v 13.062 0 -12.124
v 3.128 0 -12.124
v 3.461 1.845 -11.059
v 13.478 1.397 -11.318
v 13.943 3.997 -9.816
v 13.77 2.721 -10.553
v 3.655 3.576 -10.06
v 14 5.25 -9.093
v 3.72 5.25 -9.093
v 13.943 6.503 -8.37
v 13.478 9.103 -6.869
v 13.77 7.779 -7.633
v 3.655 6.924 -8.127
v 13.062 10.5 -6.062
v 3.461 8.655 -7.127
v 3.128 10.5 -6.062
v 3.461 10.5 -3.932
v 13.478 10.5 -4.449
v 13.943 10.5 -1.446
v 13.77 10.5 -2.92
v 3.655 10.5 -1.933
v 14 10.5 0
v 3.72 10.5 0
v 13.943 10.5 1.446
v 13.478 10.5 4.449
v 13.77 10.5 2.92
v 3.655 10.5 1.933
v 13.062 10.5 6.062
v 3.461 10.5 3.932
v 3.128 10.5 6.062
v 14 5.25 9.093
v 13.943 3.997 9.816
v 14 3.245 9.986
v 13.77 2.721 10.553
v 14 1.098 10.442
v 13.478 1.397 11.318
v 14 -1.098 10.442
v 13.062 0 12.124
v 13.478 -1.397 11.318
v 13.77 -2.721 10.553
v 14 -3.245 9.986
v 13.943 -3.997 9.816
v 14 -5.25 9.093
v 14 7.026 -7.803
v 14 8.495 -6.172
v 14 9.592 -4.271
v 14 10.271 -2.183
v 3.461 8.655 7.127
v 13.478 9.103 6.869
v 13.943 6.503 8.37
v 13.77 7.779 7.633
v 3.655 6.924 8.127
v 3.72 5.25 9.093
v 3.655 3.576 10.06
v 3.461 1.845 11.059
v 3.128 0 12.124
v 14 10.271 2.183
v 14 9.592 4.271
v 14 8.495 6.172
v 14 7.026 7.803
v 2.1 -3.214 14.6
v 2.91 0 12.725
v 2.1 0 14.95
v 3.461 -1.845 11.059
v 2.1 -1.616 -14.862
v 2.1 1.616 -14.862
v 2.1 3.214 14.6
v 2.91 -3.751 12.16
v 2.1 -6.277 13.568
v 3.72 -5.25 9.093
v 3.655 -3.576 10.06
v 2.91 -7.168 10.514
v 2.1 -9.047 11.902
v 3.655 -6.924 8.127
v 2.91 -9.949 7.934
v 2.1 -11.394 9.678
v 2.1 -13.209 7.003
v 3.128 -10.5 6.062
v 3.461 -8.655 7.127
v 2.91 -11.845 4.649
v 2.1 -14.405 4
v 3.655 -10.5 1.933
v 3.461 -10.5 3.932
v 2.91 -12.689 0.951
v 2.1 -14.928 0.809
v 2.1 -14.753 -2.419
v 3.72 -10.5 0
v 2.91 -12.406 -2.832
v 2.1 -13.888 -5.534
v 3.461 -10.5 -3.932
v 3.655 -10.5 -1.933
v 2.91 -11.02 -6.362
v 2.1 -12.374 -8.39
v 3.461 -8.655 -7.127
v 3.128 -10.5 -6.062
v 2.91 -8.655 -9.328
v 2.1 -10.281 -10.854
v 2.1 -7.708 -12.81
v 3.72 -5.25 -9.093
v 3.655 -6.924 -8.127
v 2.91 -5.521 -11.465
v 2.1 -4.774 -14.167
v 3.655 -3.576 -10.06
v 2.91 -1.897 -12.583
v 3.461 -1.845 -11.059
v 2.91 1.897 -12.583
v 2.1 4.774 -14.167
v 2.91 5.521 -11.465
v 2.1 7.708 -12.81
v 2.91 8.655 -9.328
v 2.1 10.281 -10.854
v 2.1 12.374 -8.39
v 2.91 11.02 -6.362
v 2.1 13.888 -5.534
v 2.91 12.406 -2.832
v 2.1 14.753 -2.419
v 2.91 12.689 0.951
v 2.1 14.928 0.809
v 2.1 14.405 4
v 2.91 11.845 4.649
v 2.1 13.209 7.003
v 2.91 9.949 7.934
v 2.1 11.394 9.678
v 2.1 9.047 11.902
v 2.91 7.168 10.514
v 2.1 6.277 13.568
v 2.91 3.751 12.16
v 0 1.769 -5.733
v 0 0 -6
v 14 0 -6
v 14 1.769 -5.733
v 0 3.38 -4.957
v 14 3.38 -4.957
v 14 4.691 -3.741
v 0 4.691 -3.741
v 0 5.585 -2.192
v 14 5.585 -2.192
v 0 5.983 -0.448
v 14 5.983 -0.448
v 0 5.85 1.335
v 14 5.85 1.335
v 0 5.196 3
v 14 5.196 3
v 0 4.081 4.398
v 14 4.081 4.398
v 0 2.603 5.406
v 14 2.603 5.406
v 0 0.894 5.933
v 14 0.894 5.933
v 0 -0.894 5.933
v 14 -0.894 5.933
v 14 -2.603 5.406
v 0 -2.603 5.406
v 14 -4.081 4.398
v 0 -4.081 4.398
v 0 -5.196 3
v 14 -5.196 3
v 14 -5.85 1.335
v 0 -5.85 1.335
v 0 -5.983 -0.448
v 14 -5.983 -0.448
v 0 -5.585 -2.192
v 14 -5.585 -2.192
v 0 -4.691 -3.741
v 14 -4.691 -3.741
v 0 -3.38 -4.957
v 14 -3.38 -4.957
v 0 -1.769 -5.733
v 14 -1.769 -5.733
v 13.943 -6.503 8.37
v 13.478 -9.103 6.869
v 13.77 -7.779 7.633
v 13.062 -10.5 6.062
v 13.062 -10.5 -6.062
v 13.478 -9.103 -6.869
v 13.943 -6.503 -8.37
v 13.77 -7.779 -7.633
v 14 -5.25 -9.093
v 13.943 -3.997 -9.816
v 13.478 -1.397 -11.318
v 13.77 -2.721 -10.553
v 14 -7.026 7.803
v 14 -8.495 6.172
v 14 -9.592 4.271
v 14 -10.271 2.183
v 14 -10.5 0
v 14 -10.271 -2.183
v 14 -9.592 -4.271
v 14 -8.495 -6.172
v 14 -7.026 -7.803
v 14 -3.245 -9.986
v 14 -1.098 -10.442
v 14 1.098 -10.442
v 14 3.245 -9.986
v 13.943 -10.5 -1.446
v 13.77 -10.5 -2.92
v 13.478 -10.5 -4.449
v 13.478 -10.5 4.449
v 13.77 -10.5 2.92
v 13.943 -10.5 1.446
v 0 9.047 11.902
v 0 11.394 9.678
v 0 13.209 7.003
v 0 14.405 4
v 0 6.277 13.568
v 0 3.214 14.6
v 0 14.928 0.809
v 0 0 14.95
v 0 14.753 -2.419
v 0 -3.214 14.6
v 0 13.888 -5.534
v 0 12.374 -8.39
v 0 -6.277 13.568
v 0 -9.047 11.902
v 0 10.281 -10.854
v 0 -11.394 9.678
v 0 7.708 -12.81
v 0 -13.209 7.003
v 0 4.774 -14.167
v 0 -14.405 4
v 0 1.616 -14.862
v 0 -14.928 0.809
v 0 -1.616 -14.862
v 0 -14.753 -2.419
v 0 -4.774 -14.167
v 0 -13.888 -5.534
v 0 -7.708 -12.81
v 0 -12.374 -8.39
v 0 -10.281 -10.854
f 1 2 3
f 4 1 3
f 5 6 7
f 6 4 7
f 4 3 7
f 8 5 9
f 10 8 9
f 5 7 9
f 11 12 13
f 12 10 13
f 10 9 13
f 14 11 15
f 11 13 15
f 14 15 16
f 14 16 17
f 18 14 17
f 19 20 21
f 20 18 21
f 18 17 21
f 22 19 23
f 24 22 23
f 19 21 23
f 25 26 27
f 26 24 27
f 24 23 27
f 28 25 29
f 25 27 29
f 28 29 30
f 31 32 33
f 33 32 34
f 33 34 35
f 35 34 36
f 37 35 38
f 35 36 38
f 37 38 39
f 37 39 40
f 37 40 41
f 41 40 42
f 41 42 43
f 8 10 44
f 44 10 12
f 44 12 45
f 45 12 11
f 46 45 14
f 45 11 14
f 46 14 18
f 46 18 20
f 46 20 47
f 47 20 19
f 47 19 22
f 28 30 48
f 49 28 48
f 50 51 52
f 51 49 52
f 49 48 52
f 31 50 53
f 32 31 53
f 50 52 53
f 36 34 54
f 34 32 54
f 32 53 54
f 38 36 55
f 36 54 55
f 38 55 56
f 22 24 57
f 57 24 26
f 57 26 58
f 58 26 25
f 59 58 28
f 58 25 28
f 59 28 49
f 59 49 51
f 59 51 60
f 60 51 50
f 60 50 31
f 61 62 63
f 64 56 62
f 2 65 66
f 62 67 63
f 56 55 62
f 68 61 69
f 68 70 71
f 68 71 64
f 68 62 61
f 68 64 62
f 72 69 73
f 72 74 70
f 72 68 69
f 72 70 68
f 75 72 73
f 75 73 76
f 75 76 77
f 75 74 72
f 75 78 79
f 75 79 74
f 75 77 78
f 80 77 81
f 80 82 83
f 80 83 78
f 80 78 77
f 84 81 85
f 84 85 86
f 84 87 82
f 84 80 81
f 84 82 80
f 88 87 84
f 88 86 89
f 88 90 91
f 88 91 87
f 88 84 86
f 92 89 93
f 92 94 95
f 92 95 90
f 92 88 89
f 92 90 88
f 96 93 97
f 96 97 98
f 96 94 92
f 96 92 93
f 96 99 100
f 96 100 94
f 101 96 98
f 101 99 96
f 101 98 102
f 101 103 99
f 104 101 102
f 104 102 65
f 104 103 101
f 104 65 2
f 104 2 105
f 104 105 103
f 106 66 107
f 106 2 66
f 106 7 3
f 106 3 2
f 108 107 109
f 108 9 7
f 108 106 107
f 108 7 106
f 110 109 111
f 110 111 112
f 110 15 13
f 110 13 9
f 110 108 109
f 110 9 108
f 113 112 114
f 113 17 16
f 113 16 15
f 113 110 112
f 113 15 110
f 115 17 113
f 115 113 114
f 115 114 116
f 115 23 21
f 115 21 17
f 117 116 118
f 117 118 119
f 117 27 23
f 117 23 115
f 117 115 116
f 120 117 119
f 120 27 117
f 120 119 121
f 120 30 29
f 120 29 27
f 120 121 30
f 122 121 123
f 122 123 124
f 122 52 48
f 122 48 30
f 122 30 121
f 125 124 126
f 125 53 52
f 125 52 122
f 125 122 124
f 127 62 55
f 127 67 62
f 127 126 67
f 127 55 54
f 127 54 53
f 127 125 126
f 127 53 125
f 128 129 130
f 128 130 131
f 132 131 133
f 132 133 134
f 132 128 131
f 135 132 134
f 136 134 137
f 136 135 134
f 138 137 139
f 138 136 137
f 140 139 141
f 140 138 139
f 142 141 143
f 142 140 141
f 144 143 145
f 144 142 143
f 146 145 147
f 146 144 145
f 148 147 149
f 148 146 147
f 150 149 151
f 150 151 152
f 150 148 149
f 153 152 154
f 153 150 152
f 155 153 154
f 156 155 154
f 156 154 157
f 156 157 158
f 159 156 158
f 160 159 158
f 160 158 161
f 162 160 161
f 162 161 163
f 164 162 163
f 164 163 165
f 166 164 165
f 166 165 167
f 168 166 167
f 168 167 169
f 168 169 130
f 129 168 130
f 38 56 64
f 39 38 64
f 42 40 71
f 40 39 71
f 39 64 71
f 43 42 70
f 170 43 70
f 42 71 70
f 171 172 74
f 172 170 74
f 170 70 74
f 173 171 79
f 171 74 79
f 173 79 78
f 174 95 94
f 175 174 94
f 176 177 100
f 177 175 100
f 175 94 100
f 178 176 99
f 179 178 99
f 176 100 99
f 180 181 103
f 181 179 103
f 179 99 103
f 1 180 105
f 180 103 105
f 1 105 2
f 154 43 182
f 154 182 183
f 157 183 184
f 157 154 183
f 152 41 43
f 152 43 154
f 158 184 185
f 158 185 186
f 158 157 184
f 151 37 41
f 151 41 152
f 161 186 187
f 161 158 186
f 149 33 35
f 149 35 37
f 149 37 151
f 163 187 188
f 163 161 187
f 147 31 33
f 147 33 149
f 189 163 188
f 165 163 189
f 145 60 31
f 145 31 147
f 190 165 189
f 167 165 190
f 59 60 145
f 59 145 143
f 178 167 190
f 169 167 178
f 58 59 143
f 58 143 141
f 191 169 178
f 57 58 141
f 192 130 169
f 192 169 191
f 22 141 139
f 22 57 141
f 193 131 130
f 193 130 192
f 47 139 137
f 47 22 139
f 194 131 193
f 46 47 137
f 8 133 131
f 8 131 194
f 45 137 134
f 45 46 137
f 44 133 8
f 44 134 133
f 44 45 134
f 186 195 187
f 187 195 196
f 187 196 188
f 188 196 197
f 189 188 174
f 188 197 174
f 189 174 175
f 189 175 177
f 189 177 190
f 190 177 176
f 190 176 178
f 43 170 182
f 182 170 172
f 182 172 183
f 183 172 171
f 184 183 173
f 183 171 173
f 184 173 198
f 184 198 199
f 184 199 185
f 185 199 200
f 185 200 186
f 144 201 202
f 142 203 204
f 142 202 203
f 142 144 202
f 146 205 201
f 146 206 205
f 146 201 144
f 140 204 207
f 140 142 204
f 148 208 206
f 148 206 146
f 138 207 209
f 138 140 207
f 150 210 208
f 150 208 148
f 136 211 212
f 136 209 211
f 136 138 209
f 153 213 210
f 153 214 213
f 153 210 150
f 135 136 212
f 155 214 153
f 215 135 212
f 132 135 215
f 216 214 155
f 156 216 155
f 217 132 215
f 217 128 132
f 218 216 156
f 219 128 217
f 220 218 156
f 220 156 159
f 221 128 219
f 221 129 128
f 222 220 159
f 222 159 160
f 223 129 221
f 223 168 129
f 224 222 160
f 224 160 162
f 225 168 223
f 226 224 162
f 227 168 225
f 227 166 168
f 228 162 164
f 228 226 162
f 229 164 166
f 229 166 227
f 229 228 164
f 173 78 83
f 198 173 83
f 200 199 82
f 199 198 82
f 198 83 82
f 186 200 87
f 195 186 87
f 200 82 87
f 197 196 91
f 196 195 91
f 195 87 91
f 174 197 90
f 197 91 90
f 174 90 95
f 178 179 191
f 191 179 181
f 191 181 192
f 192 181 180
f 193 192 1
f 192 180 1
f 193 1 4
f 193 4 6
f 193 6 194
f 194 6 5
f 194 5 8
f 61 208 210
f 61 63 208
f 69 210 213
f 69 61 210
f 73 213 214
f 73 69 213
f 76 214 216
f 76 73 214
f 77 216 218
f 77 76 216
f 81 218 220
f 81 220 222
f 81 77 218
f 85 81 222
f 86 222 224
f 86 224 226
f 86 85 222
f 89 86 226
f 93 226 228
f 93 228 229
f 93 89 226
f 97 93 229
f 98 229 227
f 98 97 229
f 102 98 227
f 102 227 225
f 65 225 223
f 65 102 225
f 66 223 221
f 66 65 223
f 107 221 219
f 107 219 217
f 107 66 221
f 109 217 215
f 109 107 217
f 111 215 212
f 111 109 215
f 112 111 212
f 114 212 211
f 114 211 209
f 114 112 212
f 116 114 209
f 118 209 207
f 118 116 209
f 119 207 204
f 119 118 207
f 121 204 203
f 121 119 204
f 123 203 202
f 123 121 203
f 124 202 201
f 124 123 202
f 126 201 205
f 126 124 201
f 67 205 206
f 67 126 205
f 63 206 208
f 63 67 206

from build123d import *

# Parameters (mm, degrees)
SKETCH1_R      = 6
EXTRUDE1_DEPTH = 14


# Read off the part's stored shape, not the designer's step: Cut-Extrude1
with BuildPart() as part:
    # Sketch1 → Extrude1 (new body)
    with BuildSketch(Plane(origin=(0, 0, 0), x_dir=(0, 0, -1), z_dir=(1, 0, 0))):
        Polygon((12.124355653, 0), (6.062177826, 10.5), (-6.062177826, 10.5), (-12.124355653, 0), (-6.062177826, -10.5), (6.062177826, -10.5), align=None)
        Circle(SKETCH1_R, mode=Mode.SUBTRACT)
    extrude(amount=EXTRUDE1_DEPTH)

    # Cut-Extrude1 outline → Cut-Extrude1 (revolve, cut)
    with BuildSketch(Plane.YX):
        Polygon((12.124355657, 14.000000022), (10.499999982, 14.000000022), (12.124355657, 13.062177824), align=None)
    revolve(axis=Axis((0, 0, 0), (1, 0, 0)), mode=Mode.SUBTRACT)

    # Sketch3 → Revolve1 (revolve)
    with BuildSketch(Plane.XY, mode=Mode.PRIVATE) as revolve1_sk:
        Polygon((0, 6), (0, 14.95), (2.1, 14.95), (5.357533597, 6), align=None)
    revolve(revolve1_sk.sketch.rotate(Axis((0, 0, 0), (1, 0, 0)), 90), axis=Axis((0, 0, 0), (1, 0, 0)))


solid = part.part
